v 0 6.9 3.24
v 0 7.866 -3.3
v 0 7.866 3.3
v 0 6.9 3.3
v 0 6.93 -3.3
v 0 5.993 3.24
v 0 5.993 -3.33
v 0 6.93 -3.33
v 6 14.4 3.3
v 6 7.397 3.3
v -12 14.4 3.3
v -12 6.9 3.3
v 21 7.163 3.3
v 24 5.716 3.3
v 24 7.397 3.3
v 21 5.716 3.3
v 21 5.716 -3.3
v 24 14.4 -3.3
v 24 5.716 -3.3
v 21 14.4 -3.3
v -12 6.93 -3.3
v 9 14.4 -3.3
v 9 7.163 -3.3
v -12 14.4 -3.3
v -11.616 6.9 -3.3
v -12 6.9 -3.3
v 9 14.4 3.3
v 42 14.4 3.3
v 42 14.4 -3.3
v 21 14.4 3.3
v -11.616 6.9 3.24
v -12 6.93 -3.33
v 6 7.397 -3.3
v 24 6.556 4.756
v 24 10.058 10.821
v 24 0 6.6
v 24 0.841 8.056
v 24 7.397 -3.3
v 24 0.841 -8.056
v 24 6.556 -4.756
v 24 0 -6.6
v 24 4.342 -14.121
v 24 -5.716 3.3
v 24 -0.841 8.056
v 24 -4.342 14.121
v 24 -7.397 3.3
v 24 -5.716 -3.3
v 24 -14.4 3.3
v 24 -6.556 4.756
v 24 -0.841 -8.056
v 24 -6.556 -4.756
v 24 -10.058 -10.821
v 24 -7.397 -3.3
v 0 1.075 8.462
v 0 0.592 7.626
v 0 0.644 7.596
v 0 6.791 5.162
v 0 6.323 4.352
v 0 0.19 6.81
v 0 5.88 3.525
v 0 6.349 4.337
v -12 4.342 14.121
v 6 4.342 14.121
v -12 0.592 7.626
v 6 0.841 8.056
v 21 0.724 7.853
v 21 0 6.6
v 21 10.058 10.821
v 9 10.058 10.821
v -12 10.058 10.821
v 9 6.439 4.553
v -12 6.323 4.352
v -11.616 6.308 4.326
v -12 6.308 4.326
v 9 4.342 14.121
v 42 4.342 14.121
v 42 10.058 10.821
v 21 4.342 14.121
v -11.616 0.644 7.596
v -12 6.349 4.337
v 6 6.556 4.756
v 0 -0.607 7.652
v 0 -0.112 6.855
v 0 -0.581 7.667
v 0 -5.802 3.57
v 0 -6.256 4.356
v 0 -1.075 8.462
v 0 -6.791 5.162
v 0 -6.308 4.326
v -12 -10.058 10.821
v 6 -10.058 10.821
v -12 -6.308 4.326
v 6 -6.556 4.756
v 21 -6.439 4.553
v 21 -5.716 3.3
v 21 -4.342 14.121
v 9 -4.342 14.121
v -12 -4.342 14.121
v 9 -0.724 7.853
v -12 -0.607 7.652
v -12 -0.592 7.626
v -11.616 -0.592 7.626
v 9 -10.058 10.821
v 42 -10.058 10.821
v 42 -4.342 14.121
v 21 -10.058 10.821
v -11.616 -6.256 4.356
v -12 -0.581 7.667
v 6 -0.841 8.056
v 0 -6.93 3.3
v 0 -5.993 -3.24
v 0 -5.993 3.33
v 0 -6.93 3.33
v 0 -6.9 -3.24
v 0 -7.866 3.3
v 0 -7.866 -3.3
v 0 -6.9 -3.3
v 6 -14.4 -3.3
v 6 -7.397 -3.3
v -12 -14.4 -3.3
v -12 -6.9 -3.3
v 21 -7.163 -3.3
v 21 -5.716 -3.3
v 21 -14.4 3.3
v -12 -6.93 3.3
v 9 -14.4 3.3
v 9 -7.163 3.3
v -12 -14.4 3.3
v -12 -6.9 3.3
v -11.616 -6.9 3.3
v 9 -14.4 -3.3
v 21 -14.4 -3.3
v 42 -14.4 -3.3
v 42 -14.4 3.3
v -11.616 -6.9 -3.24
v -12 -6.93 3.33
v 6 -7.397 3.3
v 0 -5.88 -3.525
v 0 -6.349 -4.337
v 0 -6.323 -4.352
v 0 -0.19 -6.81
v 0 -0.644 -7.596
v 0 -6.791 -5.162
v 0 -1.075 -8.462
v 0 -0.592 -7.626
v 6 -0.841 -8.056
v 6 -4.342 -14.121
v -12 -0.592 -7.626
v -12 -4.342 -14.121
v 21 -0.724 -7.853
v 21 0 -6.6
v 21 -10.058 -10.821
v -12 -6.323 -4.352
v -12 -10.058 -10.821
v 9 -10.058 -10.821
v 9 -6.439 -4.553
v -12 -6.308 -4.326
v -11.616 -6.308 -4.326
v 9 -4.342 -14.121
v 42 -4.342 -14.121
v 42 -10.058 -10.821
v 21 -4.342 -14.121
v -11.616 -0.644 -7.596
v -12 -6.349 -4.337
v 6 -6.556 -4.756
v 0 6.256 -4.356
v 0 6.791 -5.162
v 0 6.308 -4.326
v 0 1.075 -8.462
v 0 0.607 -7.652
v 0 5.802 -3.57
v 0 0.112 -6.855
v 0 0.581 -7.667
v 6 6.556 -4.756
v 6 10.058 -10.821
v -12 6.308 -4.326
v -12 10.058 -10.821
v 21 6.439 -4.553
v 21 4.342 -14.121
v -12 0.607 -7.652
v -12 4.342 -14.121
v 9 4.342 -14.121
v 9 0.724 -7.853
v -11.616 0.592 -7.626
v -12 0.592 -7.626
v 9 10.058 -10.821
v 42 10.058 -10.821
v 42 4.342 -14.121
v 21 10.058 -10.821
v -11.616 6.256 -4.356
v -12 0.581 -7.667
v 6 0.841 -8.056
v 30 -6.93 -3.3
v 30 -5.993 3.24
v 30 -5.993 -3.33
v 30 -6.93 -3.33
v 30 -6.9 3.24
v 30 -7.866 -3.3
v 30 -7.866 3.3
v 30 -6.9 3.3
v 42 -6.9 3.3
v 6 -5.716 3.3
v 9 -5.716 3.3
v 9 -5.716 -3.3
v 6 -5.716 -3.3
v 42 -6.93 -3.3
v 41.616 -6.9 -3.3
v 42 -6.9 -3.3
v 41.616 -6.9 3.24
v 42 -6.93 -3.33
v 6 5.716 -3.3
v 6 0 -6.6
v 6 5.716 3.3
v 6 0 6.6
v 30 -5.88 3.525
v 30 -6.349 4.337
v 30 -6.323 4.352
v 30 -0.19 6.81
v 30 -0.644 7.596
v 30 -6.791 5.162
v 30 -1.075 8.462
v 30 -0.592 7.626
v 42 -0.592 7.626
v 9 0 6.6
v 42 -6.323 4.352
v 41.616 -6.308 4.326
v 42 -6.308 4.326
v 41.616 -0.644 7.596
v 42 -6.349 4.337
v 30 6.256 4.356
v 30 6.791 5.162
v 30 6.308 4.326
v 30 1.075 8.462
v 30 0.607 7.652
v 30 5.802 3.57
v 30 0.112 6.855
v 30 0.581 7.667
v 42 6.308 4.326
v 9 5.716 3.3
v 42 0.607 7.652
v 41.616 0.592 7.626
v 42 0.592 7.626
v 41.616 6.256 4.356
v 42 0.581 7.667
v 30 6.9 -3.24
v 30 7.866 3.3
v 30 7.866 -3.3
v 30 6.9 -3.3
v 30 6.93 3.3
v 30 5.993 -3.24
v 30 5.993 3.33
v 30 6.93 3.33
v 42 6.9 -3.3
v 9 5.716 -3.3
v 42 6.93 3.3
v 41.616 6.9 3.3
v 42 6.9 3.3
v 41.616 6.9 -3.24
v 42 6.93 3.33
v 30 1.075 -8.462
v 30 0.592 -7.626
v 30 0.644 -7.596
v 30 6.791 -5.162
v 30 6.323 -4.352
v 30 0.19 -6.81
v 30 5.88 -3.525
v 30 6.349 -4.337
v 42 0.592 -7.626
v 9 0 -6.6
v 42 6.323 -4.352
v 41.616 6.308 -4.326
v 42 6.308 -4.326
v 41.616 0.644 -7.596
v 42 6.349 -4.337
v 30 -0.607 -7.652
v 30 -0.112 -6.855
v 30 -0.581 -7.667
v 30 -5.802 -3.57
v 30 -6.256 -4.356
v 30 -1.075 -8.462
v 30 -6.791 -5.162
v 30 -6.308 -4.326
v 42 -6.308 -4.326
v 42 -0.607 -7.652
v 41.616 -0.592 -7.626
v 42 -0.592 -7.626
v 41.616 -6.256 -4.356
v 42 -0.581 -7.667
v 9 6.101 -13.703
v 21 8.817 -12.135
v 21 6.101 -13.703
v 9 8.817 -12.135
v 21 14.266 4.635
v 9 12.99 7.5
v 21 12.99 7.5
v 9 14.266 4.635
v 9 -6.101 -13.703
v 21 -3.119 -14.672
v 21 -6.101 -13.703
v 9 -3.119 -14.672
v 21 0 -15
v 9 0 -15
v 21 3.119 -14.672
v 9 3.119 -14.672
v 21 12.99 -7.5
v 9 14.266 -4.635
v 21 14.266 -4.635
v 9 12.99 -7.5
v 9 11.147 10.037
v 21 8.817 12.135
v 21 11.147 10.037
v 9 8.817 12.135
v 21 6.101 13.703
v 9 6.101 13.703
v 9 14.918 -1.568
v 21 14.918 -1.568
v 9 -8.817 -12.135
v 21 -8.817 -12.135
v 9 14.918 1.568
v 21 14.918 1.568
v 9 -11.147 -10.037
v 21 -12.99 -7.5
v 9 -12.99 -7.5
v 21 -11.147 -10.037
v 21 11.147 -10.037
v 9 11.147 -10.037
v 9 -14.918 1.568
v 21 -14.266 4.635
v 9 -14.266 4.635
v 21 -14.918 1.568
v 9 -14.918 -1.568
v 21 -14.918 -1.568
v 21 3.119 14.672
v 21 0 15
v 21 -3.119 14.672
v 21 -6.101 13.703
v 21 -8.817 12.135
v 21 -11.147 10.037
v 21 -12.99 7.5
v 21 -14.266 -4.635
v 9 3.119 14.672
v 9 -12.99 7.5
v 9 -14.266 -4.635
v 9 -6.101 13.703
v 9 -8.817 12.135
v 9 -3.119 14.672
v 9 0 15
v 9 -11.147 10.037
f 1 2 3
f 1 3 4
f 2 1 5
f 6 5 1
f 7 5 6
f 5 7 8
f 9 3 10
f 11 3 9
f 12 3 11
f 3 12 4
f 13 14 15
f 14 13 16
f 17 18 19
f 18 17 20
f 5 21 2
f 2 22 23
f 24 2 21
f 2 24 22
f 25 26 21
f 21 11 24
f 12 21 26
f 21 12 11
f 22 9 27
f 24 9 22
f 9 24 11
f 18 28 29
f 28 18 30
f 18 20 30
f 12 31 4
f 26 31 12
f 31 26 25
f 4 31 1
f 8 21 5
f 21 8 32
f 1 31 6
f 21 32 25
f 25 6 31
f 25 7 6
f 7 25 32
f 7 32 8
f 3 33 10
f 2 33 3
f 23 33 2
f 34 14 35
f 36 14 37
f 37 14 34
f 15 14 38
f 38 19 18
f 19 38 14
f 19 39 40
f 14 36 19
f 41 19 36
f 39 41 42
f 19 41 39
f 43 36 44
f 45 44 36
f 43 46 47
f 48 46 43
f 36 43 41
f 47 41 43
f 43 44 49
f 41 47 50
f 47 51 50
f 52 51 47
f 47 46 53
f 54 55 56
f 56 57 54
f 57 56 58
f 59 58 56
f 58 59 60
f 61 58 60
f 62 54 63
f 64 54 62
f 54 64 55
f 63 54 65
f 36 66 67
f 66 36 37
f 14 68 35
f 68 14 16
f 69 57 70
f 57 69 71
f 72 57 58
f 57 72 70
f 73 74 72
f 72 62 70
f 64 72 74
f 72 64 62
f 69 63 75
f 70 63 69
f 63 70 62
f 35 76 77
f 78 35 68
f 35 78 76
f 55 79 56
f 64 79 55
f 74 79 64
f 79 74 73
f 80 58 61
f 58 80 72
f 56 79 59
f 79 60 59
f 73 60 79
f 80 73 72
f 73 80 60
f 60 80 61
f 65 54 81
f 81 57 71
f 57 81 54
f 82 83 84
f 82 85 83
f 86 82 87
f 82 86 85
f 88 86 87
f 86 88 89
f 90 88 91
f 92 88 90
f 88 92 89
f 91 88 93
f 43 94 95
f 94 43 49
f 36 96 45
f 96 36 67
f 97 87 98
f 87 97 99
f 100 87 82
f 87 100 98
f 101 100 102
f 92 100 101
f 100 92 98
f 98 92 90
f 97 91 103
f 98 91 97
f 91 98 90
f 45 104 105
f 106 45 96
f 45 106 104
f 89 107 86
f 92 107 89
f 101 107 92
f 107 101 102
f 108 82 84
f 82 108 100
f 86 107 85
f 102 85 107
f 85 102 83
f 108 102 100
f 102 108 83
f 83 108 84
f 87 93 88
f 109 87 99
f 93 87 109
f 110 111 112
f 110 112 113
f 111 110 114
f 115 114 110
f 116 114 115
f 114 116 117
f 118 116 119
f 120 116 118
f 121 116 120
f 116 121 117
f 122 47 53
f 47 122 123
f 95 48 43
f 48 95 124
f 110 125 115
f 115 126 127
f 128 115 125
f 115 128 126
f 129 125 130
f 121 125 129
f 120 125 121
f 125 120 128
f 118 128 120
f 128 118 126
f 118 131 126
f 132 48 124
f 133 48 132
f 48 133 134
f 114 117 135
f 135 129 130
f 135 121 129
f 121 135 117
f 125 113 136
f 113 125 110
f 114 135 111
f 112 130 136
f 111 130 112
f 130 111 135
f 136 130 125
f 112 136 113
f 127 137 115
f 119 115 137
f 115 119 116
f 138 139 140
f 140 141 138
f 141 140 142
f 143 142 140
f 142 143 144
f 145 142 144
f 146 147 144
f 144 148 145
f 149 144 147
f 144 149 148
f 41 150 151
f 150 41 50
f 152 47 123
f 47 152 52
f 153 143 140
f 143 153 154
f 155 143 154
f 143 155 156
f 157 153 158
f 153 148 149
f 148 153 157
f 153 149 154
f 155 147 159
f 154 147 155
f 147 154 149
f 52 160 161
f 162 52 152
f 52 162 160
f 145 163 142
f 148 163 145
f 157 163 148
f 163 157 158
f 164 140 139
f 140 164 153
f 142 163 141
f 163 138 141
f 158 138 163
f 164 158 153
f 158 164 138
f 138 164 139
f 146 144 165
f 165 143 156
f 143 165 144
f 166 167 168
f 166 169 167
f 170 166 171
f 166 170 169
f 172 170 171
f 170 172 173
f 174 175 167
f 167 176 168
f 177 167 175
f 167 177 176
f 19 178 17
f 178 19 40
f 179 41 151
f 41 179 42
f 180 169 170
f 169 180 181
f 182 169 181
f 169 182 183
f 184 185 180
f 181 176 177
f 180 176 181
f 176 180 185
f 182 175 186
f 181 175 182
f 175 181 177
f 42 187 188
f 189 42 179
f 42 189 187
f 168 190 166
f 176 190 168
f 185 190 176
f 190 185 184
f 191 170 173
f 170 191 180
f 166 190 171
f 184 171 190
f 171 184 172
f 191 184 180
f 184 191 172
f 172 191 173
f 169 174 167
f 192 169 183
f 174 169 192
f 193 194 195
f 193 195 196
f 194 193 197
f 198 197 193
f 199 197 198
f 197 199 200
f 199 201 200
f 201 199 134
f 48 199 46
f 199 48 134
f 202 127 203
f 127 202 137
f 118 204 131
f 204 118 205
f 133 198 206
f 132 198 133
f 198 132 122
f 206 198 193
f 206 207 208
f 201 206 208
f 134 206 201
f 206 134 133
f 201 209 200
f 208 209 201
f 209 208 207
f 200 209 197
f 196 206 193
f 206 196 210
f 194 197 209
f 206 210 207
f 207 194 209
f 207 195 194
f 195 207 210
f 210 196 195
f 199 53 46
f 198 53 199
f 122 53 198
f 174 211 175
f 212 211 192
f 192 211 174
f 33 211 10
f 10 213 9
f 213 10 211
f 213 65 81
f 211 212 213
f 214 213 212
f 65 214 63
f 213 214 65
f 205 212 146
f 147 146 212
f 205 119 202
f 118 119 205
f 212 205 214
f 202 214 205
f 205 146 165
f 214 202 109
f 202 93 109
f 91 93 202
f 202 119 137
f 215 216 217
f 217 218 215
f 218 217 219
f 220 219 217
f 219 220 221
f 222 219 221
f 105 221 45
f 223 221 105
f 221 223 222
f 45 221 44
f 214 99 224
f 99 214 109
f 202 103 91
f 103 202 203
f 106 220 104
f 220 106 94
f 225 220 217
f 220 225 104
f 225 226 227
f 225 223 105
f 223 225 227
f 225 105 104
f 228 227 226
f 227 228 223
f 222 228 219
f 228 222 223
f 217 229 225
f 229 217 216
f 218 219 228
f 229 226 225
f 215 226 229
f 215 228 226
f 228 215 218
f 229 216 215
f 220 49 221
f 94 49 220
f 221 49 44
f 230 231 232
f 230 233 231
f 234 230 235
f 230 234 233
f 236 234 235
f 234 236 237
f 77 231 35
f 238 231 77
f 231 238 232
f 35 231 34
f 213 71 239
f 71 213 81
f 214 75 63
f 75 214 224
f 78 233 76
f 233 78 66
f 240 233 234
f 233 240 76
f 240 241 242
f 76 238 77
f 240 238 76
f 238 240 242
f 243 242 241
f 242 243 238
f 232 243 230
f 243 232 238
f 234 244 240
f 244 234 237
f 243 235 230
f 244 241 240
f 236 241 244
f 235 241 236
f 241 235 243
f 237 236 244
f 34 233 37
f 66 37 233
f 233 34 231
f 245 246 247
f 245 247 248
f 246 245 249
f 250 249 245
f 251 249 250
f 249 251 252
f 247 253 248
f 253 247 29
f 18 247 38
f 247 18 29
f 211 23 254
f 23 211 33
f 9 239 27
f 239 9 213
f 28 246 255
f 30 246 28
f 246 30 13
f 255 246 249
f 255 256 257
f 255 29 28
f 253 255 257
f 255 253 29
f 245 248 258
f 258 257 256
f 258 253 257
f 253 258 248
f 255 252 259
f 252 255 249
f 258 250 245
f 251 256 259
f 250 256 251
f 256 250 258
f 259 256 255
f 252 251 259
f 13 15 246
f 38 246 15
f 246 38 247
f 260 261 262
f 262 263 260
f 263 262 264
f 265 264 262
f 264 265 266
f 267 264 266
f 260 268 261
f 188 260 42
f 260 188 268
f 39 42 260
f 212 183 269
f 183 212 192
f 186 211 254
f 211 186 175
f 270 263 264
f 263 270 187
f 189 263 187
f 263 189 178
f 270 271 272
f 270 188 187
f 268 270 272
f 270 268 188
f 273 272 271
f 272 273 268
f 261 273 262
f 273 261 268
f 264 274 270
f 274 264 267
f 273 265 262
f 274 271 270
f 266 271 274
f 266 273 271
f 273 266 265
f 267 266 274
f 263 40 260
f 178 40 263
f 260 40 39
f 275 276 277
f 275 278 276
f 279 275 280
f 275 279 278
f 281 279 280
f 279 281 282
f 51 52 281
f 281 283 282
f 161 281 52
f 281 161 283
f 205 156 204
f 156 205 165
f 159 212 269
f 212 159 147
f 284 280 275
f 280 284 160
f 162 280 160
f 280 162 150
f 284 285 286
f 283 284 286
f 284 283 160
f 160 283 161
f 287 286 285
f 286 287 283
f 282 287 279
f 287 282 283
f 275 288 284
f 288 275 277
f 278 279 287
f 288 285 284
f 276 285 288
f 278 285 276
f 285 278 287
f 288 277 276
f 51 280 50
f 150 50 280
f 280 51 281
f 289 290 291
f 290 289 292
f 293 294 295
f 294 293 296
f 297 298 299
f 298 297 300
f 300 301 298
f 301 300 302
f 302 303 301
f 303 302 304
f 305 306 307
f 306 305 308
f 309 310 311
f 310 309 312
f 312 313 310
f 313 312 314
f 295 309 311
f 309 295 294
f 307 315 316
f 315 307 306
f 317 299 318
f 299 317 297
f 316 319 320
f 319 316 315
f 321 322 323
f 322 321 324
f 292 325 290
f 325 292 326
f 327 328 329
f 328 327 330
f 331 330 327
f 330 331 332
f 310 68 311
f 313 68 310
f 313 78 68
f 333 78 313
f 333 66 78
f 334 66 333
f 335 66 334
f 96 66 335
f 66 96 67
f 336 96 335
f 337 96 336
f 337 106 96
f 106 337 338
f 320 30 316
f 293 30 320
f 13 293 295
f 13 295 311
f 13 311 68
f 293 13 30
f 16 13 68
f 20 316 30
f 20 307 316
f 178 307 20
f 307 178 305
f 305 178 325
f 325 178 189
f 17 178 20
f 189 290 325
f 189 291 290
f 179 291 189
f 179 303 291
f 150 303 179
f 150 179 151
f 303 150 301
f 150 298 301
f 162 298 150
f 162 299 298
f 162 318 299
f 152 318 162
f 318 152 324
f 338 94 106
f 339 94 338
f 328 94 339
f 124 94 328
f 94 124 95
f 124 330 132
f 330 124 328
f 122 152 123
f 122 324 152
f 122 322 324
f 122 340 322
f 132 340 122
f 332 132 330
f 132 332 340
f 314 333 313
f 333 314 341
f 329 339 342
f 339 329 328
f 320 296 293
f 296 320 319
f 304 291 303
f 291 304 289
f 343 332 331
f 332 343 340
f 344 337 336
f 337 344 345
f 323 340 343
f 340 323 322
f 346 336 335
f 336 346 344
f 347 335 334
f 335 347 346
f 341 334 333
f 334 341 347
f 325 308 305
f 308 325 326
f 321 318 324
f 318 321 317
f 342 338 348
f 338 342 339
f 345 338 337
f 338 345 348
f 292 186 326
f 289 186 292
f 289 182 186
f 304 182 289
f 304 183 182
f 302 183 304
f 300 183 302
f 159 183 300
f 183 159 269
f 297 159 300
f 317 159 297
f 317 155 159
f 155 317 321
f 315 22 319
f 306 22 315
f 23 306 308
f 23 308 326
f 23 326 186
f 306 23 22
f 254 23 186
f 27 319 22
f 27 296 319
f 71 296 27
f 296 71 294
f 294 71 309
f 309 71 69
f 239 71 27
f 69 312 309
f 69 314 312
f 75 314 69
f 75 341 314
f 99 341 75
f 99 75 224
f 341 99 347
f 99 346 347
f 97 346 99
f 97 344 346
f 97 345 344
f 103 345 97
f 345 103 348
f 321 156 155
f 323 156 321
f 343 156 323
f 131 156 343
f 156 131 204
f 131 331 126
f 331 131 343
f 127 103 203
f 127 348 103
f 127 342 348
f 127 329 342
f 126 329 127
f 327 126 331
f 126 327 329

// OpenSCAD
$fn = 30;
module tapered_cube(dim, center=true){
    w_top = dim[0];
    d_top = dim[1];
    w_bot = dim[2];
    d_bot = dim[3];
    h     = dim[4];
    dw = w_bot - w_top;
    dd = d_bot - d_top;
    
    CubePointsNonCenter = [
      [  0,     0,      0 ],  //0
      [ w_bot,  0,      0 ],  //1
      [ w_bot,  d_bot,  0 ],  //2
      [  0,     d_bot,  0 ],  //3
      [ dw/2,          dd/2,      h ],  //4
      [ w_top + dw/2,  dd/2,      h ],  //5
      [ w_top + dw/2,  d_top + dd/2,  h ],  //6
      [ dw/2,          d_top + dd/2,  h ]]; //7
    
    CubePointsCenter = [
      [ -w_bot/2, -d_bot/2,     -h/2 ],  //0
      [  w_bot/2, -d_bot/2,     -h/2 ],  //1
      [  w_bot/2,  d_bot/2,     -h/2 ],  //2
      [ -w_bot/2,  d_bot/2,     -h/2 ],  //3
      [ -w_top/2, -d_top/2,      h/2 ],  //4
      [  w_top/2, -d_top/2,      h/2 ],  //5
      [  w_top/2,  d_bot/2,      h/2 ],  //6
      [ -w_top/2,  d_bot/2,      h/2 ]]; //7
      
    CubePoints = center ? CubePointsCenter : CubePointsNonCenter;
   
    CubeFaces = [
      [0,1,2,3],  // bottom
      [4,5,1,0],  // front
      [7,6,5,4],  // top
      [5,6,2,1],  // right
      [6,7,3,2],  // back
      [7,4,0,3]]; // left
    dims = dim;
    polyhedron( CubePoints, CubeFaces );
}
//tapered_cube([228.8/2, 139.6/2, 220.8, 130.2, 210.1]);

module rounded_cube(d,r=3,center=true) {
    minkowski() {
        ca = center ? 0 : 2*r;
        ct = center ? 0 : r;
        
        translate([ct,ct]) cube([d[0]-ca, d[1]-ca, d[2]-ca], center=center);
        sphere(r);
    }
}


module pos_hemi(dims){
    translate([0,-dims[1]/2,0])
        cube([dims[0],dims[1],dims[2]]);
}
module pn_hemi(size = 300){
    translate([00,-size/2,-size/2])
        cube([size,size,size]);
}


module reenforced_case(dims, inner=10, outer=20, center=true){
    dim = dims;
    w_top = dim[0];
    d_top = dim[1];
    w_bot = dim[0];
    d_bot = dim[1];
    h     = dim[2];
    dw = w_bot - w_top;
    dd = d_bot - d_top;
    
    CubePointsNonCenter = [
      [  0,     0,      0 ],  //0
      [ w_bot,  0,      0 ],  //1
      [ w_bot,  d_bot,  0 ],  //2
      [  0,     d_bot,  0 ],  //3
      [ dw/2,          dd/2,      h ],  //4
      [ w_top + dw/2,  dd/2,      h ],  //5
      [ w_top + dw/2,  d_top + dd/2,  h ],  //6
      [ dw/2,          d_top + dd/2,  h ]]; //7
    
    CubePointsCenter = [
      [ -w_bot/2, -d_bot/2,     -h/2 ],  //0
      [  w_bot/2, -d_bot/2,     -h/2 ],  //1
      [  w_bot/2,  d_bot/2,     -h/2 ],  //2
      [ -w_bot/2,  d_bot/2,     -h/2 ],  //3
      [ -w_top/2, -d_top/2,      h/2 ],  //4
      [  w_top/2, -d_top/2,      h/2 ],  //5
      [  w_top/2,  d_bot/2,      h/2 ],  //6
      [ -w_top/2,  d_bot/2,      h/2 ]]; //7
      
    CubePoints = center ? CubePointsCenter : CubePointsNonCenter;
   
    CubeFaces = [
      [0,1,2,3],  // bottom
      [4,5,1,0],  // front
      [7,6,5,4],  // top
      [5,6,2,1],  // right
      [6,7,3,2],  // back
      [7,4,0,3]]; // left
    
    faceCount = 6; // 6 faces on a cube
    for(i = [0:faceCount-1]){
        echo("i");
        echo(i);
        face = CubeFaces[i];
        echo("face");
        echo(face);
        vertPerFace = 4;
        for(vi = [0:vertPerFace-1]){
            v = CubePoints[face[vi]];
            translate(v)
            rounded_cube([outer,outer,outer]);
            hull(){
                v = CubePoints[face[vi]];
                translate(v)
                rounded_cube([inner,inner,inner]);
                v2 = CubePoints[face[(vi + 1) % vertPerFace]];
                translate(v2)
                rounded_cube([inner,inner,inner]);
            }
        }
    
    }
}

module prism(l, w, h){
   polyhedron(
           points=[[0,0,0], [l,0,0], [l,w,0], [0,w,0], [0,w,h], [l,w,h]],
           faces=[[0,1,2,3],[5,4,3,2],[0,4,5,1],[0,3,4],[5,2,1]]
           );
   /*
   // preview unfolded (do not include in your function
   z = 0.08;
   separation = 2;
   border = .2;
   translate([0,w+separation,0])
       cube([l,w,z]);
   translate([0,w+separation+w+border,0])
       cube([l,h,z]);
   translate([0,w+separation+w+border+h+border,0])
       cube([l,sqrt(w*w+h*h),z]);
   translate([l+border,w+separation+w+border+h+border,0])
       polyhedron(
               points=[[0,0,0],[h,0,0],[0,sqrt(w*w+h*h),0], [0,0,z],[h,0,z],[0,sqrt(w*w+h*h),z]],
               faces=[[0,1,2], [3,5,4], [0,3,4,1], [1,4,5,2], [2,5,3,0]]
               );
   translate([0-border,w+separation+w+border+h+border,0])
       polyhedron(
               points=[[0,0,0],[0-h,0,0],[0,sqrt(w*w+h*h),0], [0,0,z],[0-h,0,z],[0,sqrt(w*w+h*h),z]],
               faces=[[1,0,2],[5,3,4],[0,1,4,3],[1,2,5,4],[2,0,3,5]]
               );
               */
   }
       
e = 0.01;
module snapCellSingle(cellwidth = 5, cellLength = 10, height = 10){
    halffactor = 16;
    halfgrip = cellLength/halffactor;
    translate([-cellwidth/2,0,0])
    cube([cellwidth/2,cellLength/2,height]);
    translate([0,-halfgrip+e,-e])
    rotate([0,-90,0])
    prism(height-e,halfgrip,cellwidth/2);
}

module snapCellInverse(cellwidth = 5, cellLength = 10, height = 10){
    sf = 1.1;
    translate([-e,-e,-e])
    rotate([0,0,180])
    scale([sf,sf,sf])
        snapCellSingle(cellwidth,cellLength,height);
    
}

module radialSnap(cellwidth= 10, cellLength = 20, height = 10, smooth=false){
    snapCellSingle(cellwidth, cellLength, height);
    difference(){
        //rotate([0,0,180]){
        pos_hemi([cellwidth, cellLength, height]);
        snapCellInverse(cellwidth, cellLength, height);
    }

}

module RadialSnapArrayFemale(radius = 2.3,
    count = 6,
    cellwidth= 8,
    cellLength = 5,
    height = 2.2,
    smooth=false){
     for(i = [0: 360/count: 360]){
         rotate([i,0,0])
         translate([0, radius, -height/2])
            radialSnap(cellwidth,cellLength, height);  
     }
}
module RadialSnapArrayMale(radius = 2.3,
    count = 6,
    cellwidth= 8,
    cellLength = 5,
    height = 2.2,
    smooth=false){
     for(i = [0: 360/count: 360]){
         rotate([i,0,0])
         translate([0, -radius, -height/2])
            radialSnap(cellwidth,cellLength, height);  
     }
}

module SmoothRadialSnapArray(radius = 30,
        count = 8,
        cellwidth= 40,
        cellLength = 30,
        height = 15){
    minkowski() {
        
        RadialSnapArray(radius = radius, count = count, cellwidth= cellwidth,  cellLength = cellLength, height = height);
        sphere(2);
    }
}

module ffBar100(){
    translate([100/2,0,0])
    rotate([0,90,0])
    cylinder(h = 90, r = 5, center=true);
    RadialSnapArrayFemale();
    translate([100,0,0])
    rotate([0,0,180])
    RadialSnapArrayFemale();
    
}
module ffBar10(h = 10){
    translate([h/2,0,0])
    rotate([0,90,0])
    cylinder(h = h*.4, r = 5, center=true);
    RadialSnapArrayFemale();
    translate([h,0,0])
    rotate([0,0,180])
    RadialSnapArrayFemale();
    
}
//ffBar100();

module jack100(){
    rotate([0,90,0])
    cylinder(h = 8, r = 5, center=true);
    translate([-10,0,0])
    RadialSnapArrayMale();
}

module jack100_3way(){
    jack100();
    rotate([0,90,0])
    jack100();
    rotate([0,0,90])
    jack100();
}

scale([3, 3, 3])
ffBar10();
//jack100_3way();

module snapPlane(){
    sh = 20;
    cellwidth= 5;
    for(i = [0: cellwidth:30]){
        translate([i,0,0])
        snapCell1D(cellwidth,sh);
    }
}
//snapPlane();

module tapered_rounded_cube(dim,r) {
    dim = dim - [2*r, 2*r, 2*r, 2*r, 2*r];
    echo("TRC");
    /*
    for (d = [0:len(dim)]){
        echo(d);
        dim[d] = dim[d] - 2*r;
    }*/
    minkowski() {
        
        translate([r,r]) tapered_cube(dim);
        sphere(r);
    }
}

module hollowed_tapered_rounded_cube(dim,r,thickness = 3){
    t = thickness;
    dim_thick = dim + [2*t, 2*t, 2*t, 2*t, 2*t];
    difference(){
        translate([-t,-t,-t])
        tapered_rounded_cube(dim_thick,r);
        tapered_cube(dim);
    }
}
//hollowed_tapered_rounded_cube([200,300,100,200,300], 5, 10);
